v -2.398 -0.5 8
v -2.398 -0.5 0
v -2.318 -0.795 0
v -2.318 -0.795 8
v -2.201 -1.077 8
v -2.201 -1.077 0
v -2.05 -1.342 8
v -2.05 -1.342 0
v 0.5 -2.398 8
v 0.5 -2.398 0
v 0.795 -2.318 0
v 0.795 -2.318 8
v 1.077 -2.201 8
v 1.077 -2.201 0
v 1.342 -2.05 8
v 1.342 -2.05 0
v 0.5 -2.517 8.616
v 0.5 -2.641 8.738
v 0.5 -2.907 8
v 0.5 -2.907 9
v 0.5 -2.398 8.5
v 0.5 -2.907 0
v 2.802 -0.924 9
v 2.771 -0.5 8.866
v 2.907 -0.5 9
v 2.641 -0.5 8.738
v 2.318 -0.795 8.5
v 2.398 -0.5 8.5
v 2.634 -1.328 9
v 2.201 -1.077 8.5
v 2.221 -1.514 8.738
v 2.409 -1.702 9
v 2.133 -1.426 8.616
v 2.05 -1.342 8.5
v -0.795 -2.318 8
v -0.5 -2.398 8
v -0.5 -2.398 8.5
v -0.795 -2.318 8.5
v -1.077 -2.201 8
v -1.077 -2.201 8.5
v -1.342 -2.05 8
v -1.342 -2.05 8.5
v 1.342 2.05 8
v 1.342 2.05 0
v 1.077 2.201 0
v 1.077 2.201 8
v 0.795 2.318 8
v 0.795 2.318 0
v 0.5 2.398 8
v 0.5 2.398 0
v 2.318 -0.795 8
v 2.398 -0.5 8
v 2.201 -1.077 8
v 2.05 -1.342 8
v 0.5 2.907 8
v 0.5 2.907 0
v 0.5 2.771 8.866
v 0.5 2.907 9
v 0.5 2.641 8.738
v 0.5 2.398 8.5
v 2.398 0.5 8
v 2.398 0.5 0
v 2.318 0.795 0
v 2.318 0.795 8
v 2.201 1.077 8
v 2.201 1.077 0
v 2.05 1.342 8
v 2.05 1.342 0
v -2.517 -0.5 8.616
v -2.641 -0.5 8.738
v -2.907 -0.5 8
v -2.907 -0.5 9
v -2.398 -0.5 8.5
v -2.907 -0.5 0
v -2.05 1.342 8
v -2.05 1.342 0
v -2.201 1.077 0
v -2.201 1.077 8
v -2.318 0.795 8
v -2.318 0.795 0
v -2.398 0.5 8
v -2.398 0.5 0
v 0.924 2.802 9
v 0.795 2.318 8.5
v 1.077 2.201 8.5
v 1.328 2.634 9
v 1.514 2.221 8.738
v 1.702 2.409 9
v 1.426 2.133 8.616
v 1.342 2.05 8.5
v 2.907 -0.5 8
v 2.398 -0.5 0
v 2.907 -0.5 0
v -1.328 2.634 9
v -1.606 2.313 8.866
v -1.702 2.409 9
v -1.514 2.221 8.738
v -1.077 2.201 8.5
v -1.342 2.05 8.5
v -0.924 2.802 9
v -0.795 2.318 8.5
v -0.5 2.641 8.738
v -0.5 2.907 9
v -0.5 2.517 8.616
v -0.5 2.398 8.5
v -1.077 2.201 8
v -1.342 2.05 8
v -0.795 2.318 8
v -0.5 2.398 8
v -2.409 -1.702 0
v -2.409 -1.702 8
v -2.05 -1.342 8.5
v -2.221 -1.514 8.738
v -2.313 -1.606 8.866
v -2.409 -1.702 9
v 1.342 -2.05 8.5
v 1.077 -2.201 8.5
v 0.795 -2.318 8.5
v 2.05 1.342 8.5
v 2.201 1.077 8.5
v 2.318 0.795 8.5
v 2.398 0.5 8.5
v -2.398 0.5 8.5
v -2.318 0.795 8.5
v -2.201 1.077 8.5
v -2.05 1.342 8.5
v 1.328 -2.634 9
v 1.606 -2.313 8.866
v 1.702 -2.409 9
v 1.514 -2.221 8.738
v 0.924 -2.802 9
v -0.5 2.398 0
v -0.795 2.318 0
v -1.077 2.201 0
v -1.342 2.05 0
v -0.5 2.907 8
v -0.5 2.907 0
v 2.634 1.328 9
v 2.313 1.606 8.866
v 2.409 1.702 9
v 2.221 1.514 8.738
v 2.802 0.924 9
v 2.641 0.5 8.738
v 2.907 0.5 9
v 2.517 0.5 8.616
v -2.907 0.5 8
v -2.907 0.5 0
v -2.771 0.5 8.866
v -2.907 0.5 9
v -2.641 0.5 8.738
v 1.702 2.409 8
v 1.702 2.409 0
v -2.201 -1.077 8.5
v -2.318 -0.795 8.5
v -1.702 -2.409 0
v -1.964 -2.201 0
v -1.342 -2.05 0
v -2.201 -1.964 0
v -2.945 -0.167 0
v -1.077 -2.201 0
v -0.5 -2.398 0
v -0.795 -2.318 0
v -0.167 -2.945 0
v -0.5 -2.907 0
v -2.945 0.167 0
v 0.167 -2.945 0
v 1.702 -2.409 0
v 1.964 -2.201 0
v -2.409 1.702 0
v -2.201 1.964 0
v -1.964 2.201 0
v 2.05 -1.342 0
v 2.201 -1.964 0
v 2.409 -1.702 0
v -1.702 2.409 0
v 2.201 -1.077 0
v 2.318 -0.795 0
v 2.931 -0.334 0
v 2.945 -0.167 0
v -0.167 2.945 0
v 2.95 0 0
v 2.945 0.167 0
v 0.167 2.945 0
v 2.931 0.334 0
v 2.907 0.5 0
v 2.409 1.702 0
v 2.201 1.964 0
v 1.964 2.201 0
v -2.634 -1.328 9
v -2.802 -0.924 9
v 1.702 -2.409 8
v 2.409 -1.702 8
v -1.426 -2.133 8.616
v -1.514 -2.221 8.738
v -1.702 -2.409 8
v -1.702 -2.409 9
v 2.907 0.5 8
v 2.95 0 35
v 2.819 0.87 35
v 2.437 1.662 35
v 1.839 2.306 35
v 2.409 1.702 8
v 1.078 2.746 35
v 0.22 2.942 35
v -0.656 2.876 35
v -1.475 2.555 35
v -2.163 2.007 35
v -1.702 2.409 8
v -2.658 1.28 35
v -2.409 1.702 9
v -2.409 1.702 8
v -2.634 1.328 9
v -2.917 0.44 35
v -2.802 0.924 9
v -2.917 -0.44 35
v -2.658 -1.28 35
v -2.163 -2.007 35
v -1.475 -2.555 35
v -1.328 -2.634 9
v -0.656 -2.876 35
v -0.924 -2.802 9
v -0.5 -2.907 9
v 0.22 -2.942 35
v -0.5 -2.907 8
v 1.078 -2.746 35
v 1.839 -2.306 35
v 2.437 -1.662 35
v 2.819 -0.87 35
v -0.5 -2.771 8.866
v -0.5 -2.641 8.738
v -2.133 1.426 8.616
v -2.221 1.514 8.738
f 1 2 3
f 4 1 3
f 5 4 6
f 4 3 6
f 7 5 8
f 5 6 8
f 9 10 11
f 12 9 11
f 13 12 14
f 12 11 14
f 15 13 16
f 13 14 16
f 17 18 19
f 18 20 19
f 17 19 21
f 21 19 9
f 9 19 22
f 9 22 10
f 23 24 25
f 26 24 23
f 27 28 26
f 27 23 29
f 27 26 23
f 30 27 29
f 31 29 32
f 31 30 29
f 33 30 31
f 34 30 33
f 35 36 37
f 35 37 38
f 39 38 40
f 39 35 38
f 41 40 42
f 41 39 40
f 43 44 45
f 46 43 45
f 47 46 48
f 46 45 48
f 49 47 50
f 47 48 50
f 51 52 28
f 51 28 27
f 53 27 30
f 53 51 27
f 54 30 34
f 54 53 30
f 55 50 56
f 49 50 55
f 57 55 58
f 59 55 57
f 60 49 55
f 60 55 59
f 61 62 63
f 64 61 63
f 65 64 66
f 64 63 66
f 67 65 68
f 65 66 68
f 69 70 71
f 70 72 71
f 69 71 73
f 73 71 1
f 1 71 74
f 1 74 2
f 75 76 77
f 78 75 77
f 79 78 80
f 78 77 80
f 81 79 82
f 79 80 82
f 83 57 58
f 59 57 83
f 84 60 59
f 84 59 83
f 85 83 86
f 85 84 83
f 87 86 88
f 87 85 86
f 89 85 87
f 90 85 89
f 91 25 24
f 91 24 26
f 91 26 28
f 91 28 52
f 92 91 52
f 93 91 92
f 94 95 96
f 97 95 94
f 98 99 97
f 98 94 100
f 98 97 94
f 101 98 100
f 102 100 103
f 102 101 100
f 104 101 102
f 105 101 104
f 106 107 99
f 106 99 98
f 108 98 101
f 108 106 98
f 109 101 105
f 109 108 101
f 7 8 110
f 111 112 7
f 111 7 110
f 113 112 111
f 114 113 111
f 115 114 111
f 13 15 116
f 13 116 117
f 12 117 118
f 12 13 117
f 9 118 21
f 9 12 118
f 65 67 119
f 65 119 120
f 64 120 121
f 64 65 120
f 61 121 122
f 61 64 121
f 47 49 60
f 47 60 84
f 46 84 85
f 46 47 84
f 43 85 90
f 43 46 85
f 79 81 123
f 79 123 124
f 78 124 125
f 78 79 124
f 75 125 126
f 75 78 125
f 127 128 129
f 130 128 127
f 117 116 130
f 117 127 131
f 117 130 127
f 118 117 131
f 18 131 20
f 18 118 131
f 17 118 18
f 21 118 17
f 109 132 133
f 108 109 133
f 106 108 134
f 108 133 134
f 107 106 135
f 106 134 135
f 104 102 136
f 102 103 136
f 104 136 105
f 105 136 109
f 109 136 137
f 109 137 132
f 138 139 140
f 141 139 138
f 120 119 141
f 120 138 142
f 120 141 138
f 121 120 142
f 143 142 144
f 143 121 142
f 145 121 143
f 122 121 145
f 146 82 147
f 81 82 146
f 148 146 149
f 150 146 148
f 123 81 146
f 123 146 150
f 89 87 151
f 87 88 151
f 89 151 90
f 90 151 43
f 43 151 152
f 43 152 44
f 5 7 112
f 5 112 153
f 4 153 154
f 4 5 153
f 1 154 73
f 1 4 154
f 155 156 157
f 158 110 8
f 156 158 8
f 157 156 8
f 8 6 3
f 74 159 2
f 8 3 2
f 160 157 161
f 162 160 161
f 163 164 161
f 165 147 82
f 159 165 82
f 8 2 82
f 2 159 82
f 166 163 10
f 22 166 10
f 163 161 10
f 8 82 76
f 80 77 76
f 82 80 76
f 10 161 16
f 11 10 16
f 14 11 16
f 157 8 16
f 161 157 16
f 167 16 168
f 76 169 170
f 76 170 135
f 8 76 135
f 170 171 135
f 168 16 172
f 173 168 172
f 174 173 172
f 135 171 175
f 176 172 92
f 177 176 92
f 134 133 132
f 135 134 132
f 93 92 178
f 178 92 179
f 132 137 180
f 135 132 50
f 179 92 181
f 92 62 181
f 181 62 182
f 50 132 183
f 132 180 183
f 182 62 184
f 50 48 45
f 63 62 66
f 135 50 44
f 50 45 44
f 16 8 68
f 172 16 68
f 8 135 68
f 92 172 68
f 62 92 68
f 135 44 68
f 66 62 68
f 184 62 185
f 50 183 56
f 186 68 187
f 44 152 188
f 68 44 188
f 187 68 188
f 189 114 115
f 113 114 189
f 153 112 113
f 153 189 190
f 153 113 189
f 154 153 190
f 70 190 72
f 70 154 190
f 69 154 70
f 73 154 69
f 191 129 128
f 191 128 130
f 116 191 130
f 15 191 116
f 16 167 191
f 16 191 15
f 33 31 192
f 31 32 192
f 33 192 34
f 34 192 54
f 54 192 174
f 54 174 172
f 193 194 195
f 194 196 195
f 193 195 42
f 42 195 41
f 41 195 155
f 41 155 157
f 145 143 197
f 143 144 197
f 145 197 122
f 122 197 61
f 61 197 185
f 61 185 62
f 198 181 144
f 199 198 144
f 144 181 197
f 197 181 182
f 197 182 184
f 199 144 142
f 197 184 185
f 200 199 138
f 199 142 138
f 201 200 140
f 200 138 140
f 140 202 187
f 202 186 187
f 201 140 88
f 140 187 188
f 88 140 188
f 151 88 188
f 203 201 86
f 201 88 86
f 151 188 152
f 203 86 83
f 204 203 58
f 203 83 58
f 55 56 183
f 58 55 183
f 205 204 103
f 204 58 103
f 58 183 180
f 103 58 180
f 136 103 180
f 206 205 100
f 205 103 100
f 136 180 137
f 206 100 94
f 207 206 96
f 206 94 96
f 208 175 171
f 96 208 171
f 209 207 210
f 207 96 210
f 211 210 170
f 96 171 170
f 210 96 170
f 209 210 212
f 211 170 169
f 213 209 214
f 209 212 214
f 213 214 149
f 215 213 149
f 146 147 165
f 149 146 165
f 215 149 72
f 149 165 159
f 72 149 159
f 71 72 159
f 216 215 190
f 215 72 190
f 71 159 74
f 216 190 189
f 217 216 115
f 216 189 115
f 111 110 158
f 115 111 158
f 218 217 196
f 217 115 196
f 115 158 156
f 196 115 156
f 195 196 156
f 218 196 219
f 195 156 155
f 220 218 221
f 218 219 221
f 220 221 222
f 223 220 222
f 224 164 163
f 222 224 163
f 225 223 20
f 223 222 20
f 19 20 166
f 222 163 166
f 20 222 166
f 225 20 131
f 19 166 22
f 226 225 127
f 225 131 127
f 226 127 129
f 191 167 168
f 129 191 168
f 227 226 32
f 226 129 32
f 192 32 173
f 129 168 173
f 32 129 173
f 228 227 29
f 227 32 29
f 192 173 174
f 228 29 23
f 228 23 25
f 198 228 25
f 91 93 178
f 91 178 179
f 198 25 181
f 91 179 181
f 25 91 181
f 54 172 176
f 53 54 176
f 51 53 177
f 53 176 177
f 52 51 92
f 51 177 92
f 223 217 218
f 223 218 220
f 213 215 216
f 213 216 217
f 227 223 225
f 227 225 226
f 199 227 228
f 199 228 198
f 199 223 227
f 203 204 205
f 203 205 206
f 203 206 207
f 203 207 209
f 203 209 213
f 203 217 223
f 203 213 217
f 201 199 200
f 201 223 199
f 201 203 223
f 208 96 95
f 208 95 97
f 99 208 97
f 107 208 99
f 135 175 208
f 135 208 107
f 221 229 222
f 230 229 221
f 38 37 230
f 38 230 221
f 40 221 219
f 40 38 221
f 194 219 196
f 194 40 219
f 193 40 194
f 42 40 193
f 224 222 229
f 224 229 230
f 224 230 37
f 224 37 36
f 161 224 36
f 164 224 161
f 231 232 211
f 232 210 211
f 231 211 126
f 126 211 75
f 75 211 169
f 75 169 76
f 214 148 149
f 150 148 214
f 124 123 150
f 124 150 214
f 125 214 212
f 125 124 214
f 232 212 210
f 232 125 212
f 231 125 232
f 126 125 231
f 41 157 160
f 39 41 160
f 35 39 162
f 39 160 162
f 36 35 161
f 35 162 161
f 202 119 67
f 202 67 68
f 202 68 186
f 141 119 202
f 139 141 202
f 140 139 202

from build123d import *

# Parameters (mm, degrees)
SKETCH1_R           = 2.95
BOSS_EXTRUDE1_DEPTH = 35
CUT_EXTRUDE1_DEPTH  = 8
CHAMFER1_SIZE       = 1


with BuildPart() as part:
    # Sketch1 → Boss-Extrude1 (new body)
    with BuildSketch(Plane.XY):
        Circle(SKETCH1_R)
    extrude(amount=BOSS_EXTRUDE1_DEPTH)

    # Sketch2 → Cut-Extrude1 (cut)
    with BuildSketch(Plane(origin=(0, 0, 0), x_dir=(-1, 0, 0), z_dir=(0, 0, -1))):
        with BuildLine():
            ThreePointArc((-2.398436991, 0.5), (-2.263504855, 0.937574409), (-2.049504451, 1.34239767))
            Line((-2.049504451, 1.34239767), (-2.409337912, 1.702231131))
            ThreePointArc((-2.409337912, 1.702231131), (-2.725444621, 1.128916125), (-2.907318352, 0.5))
            Line((-2.907318352, 0.5), (-2.398436991, 0.5))
        make_face()
        with BuildLine():
            ThreePointArc((-1.34239767, 2.049504451), (-0.937574409, 2.263504855), (-0.5, 2.398436991))
            Line((-0.5, 2.398436991), (-0.5, 2.907318352))
            ThreePointArc((-0.5, 2.907318352), (-1.128916125, 2.725444621), (-1.702231131, 2.409337912))
            Line((-1.702231131, 2.409337912), (-1.34239767, 2.049504451))
        make_face()
        with BuildLine():
            Line((0.5, 2.907318352), (0.5, 2.398436991))
            ThreePointArc((0.5, 2.398436991), (0.937574409, 2.263504855), (1.34239767, 2.049504451))
            Line((1.34239767, 2.049504451), (1.702231131, 2.409337912))
            ThreePointArc((1.702231131, 2.409337912), (1.128916125, 2.725444621), (0.5, 2.907318352))
        make_face()
        with BuildLine():
            Line((2.409337912, 1.702231131), (2.049504451, 1.34239767))
            ThreePointArc((2.049504451, 1.34239767), (2.263504855, 0.937574409), (2.398436991, 0.5))
            Line((2.398436991, 0.5), (2.907318352, 0.5))
            ThreePointArc((2.907318352, 0.5), (2.725444621, 1.128916125), (2.409337912, 1.702231131))
        make_face()
        with BuildLine():
            Line((2.907318352, -0.5), (2.398436991, -0.5))
            ThreePointArc((2.398436991, -0.5), (2.263504855, -0.937574409), (2.049504451, -1.34239767))
            Line((2.049504451, -1.34239767), (2.409337912, -1.702231131))
            ThreePointArc((2.409337912, -1.702231131), (2.725444621, -1.128916125), (2.907318352, -0.5))
        make_face()
        with BuildLine():
            Line((1.702231131, -2.409337912), (1.34239767, -2.049504451))
            ThreePointArc((1.34239767, -2.049504451), (0.937574409, -2.263504855), (0.5, -2.398436991))
            Line((0.5, -2.398436991), (0.5, -2.907318352))
            ThreePointArc((0.5, -2.907318352), (1.128916125, -2.725444621), (1.702231131, -2.409337912))
        make_face()
        with BuildLine():
            ThreePointArc((-0.5, -2.398436991), (-0.937574409, -2.263504855), (-1.34239767, -2.049504451))
            Line((-1.34239767, -2.049504451), (-1.702231131, -2.409337912))
            ThreePointArc((-1.702231131, -2.409337912), (-1.128916125, -2.725444621), (-0.5, -2.907318352))
            Line((-0.5, -2.907318352), (-0.5, -2.398436991))
        make_face()
        with BuildLine():
            ThreePointArc((-2.049504451, -1.34239767), (-2.263504855, -0.937574409), (-2.398436991, -0.5))
            Line((-2.398436991, -0.5), (-2.907318352, -0.5))
            ThreePointArc((-2.907318352, -0.5), (-2.725444621, -1.128916125), (-2.409337912, -1.702231131))
            Line((-2.409337912, -1.702231131), (-2.049504451, -1.34239767))
        make_face()
    extrude(amount=-CUT_EXTRUDE1_DEPTH, mode=Mode.SUBTRACT)

    # Chamfer1
    # the kernel refuses this chamfer: 1 mm, written as the material it takes off along each edge
    with BuildSketch(Plane(origin=(0, 0, 8), x_dir=(0.6453423073627431, -0.7638935176631171, 0), z_dir=(0.7638935176631171, 0.6453423073627431, 0))) as chamfer1_piece_1_section:
        Polygon((2.95, -CHAMFER1_SIZE), (2.95 - CHAMFER1_SIZE, 0), (2.95, 0), align=None)
    chamfer1_piece_1 = revolve(axis=Axis((0, 0, 8), (0, 0, -1)), revolution_arc=125.382690704, mode=Mode.PRIVATE)
    chamfer1_piece_1 = split(chamfer1_piece_1, bisect_by=Plane(origin=(0.5, 0, 8), z_dir=(1, 0, 0)), keep=Keep.TOP, mode=Mode.PRIVATE)
    chamfer1_piece_1 = split(chamfer1_piece_1, bisect_by=Plane(origin=(-0.353553391, -0.353553391, 8), z_dir=(-0.7071067811865415, -0.7071067811865537, 0)), keep=Keep.TOP, mode=Mode.PRIVATE)
    chamfer1_piece_1 = chamfer1_piece_1 - Plane(origin=(0, 0, 8), x_dir=(0.20408163265306725, -0.9789538738948115, 0), z_dir=(0, 0, -1)) * Cylinder(2.45, 12, mode=Mode.PRIVATE)
    add(chamfer1_piece_1, mode=Mode.SUBTRACT)
    with BuildSketch(Plane(origin=(0, 0, 8), x_dir=(0.6453423073627431, -0.7638935176631171, 0), z_dir=(0.7638935176631171, 0.6453423073627431, 0))) as chamfer1_piece_2_section:
        Polygon((2.95, -CHAMFER1_SIZE), (2.95 - CHAMFER1_SIZE, 0), (2.95, 0), align=None)
    chamfer1_piece_2 = revolve(axis=Axis((0, 0, 8), (0, 0, -1)), revolution_arc=125.382690704, mode=Mode.PRIVATE)
    chamfer1_piece_2 = split(chamfer1_piece_2, bisect_by=Plane(origin=(0.353553391, -0.353553391, 8), z_dir=(0.7071067811865517, -0.7071067811865434, 0)), keep=Keep.TOP, mode=Mode.PRIVATE)
    chamfer1_piece_2 = split(chamfer1_piece_2, bisect_by=Plane(origin=(-0.5, 0, 8), z_dir=(-1, 0, 0)), keep=Keep.TOP, mode=Mode.PRIVATE)
    chamfer1_piece_2 = chamfer1_piece_2 - Plane(origin=(0, 0, 8), x_dir=(0.20408163265306725, -0.9789538738948115, 0), z_dir=(0, 0, -1)) * Cylinder(2.45, 12, mode=Mode.PRIVATE)
    add(chamfer1_piece_2, mode=Mode.SUBTRACT)
    with BuildSketch(Plane(origin=(0, 0, 8), x_dir=(0.6453423073627431, -0.7638935176631171, 0), z_dir=(0.7638935176631171, 0.6453423073627431, 0))) as chamfer1_piece_3_section:
        Polygon((2.95, -CHAMFER1_SIZE), (2.95 - CHAMFER1_SIZE, 0), (2.95, 0), align=None)
    chamfer1_piece_3 = revolve(axis=Axis((0, 0, 8), (0, 0, -1)), revolution_arc=125.382690704, mode=Mode.PRIVATE)
    chamfer1_piece_3 = split(chamfer1_piece_3, bisect_by=Plane(origin=(0, -0.5, 8), z_dir=(0, -1, 0)), keep=Keep.TOP, mode=Mode.PRIVATE)
    chamfer1_piece_3 = split(chamfer1_piece_3, bisect_by=Plane(origin=(-0.353553391, 0.353553391, 8), z_dir=(-0.7071067811865515, 0.7071067811865437, 0)), keep=Keep.TOP, mode=Mode.PRIVATE)
    chamfer1_piece_3 = chamfer1_piece_3 - Plane(origin=(0, 0, 8), x_dir=(0.20408163265306725, -0.9789538738948115, 0), z_dir=(0, 0, -1)) * Cylinder(2.45, 12, mode=Mode.PRIVATE)
    add(chamfer1_piece_3, mode=Mode.SUBTRACT)
    with BuildSketch(Plane(origin=(0, 0, 8), x_dir=(-0.083828364721268, -0.9964802081668046, 0), z_dir=(0.9964802081668046, -0.083828364721268, 0))) as chamfer1_piece_4_section:
        Polygon((2.95, -CHAMFER1_SIZE), (2.95 - CHAMFER1_SIZE, 0), (2.95, 0), align=None)
    chamfer1_piece_4 = revolve(axis=Axis((0, 0, 8), (0, 0, -1)), revolution_arc=125.382690704, mode=Mode.PRIVATE)
    chamfer1_piece_4 = split(chamfer1_piece_4, bisect_by=Plane(origin=(0.353553391, -0.353553391, 8), z_dir=(0.7071067811865517, -0.7071067811865434, 0)), keep=Keep.TOP, mode=Mode.PRIVATE)
    chamfer1_piece_4 = split(chamfer1_piece_4, bisect_by=Plane(origin=(-0.5, 0, 8), z_dir=(-1, 0, 0)), keep=Keep.TOP, mode=Mode.PRIVATE)
    chamfer1_piece_4 = chamfer1_piece_4 - Plane(origin=(0, 0, 8), x_dir=(-0.5479174163352548, -0.8365324290644679, 0), z_dir=(0, 0, -1)) * Cylinder(2.45, 12, mode=Mode.PRIVATE)
    add(chamfer1_piece_4, mode=Mode.SUBTRACT)
    with BuildSketch(Plane(origin=(0, 0, 8), x_dir=(-0.083828364721268, -0.9964802081668046, 0), z_dir=(0.9964802081668046, -0.083828364721268, 0))) as chamfer1_piece_5_section:
        Polygon((2.95, -CHAMFER1_SIZE), (2.95 - CHAMFER1_SIZE, 0), (2.95, 0), align=None)
    chamfer1_piece_5 = revolve(axis=Axis((0, 0, 8), (0, 0, -1)), revolution_arc=125.382690704, mode=Mode.PRIVATE)
    chamfer1_piece_5 = split(chamfer1_piece_5, bisect_by=Plane(origin=(0, -0.5, 8), z_dir=(0, -1, 0)), keep=Keep.TOP, mode=Mode.PRIVATE)
    chamfer1_piece_5 = split(chamfer1_piece_5, bisect_by=Plane(origin=(-0.353553391, 0.353553391, 8), z_dir=(-0.7071067811865515, 0.7071067811865437, 0)), keep=Keep.TOP, mode=Mode.PRIVATE)
    chamfer1_piece_5 = chamfer1_piece_5 - Plane(origin=(0, 0, 8), x_dir=(-0.5479174163352548, -0.8365324290644679, 0), z_dir=(0, 0, -1)) * Cylinder(2.45, 12, mode=Mode.PRIVATE)
    add(chamfer1_piece_5, mode=Mode.SUBTRACT)
    with BuildSketch(Plane(origin=(0, 0, 8), x_dir=(-0.083828364721268, -0.9964802081668046, 0), z_dir=(0.9964802081668046, -0.083828364721268, 0))) as chamfer1_piece_6_section:
        Polygon((2.95, -CHAMFER1_SIZE), (2.95 - CHAMFER1_SIZE, 0), (2.95, 0), align=None)
    chamfer1_piece_6 = revolve(axis=Axis((0, 0, 8), (0, 0, -1)), revolution_arc=125.382690704, mode=Mode.PRIVATE)
    chamfer1_piece_6 = split(chamfer1_piece_6, bisect_by=Plane(origin=(-0.353553391, -0.353553391, 8), z_dir=(-0.7071067811865454, -0.7071067811865497, 0)), keep=Keep.TOP, mode=Mode.PRIVATE)
    chamfer1_piece_6 = split(chamfer1_piece_6, bisect_by=Plane(origin=(0, 0.5, 8), z_dir=(0, 1, 0)), keep=Keep.TOP, mode=Mode.PRIVATE)
    chamfer1_piece_6 = chamfer1_piece_6 - Plane(origin=(0, 0, 8), x_dir=(-0.5479174163352548, -0.8365324290644679, 0), z_dir=(0, 0, -1)) * Cylinder(2.45, 12, mode=Mode.PRIVATE)
    add(chamfer1_piece_6, mode=Mode.SUBTRACT)
    with BuildSketch(Plane(origin=(0, 0, 8), x_dir=(-0.7638935176631205, -0.645342307362739, 0), z_dir=(0.645342307362739, -0.7638935176631205, 0))) as chamfer1_piece_7_section:
        Polygon((2.95, -CHAMFER1_SIZE), (2.95 - CHAMFER1_SIZE, 0), (2.95, 0), align=None)
    chamfer1_piece_7 = revolve(axis=Axis((0, 0, 8), (0, 0, -1)), revolution_arc=125.382690704, mode=Mode.PRIVATE)
    chamfer1_piece_7 = split(chamfer1_piece_7, bisect_by=Plane(origin=(0, -0.5, 8), z_dir=(0, -1, 0)), keep=Keep.TOP, mode=Mode.PRIVATE)
    chamfer1_piece_7 = split(chamfer1_piece_7, bisect_by=Plane(origin=(-0.353553391, 0.353553391, 8), z_dir=(-0.7071067811865515, 0.7071067811865437, 0)), keep=Keep.TOP, mode=Mode.PRIVATE)
    chamfer1_piece_7 = chamfer1_piece_7 - Plane(origin=(0, 0, 8), x_dir=(-0.9789538738948118, -0.20408163265306617, 0), z_dir=(0, 0, -1)) * Cylinder(2.45, 12, mode=Mode.PRIVATE)
    add(chamfer1_piece_7, mode=Mode.SUBTRACT)
    with BuildSketch(Plane(origin=(0, 0, 8), x_dir=(-0.7638935176631205, -0.645342307362739, 0), z_dir=(0.645342307362739, -0.7638935176631205, 0))) as chamfer1_piece_8_section:
        Polygon((2.95, -CHAMFER1_SIZE), (2.95 - CHAMFER1_SIZE, 0), (2.95, 0), align=None)
    chamfer1_piece_8 = revolve(axis=Axis((0, 0, 8), (0, 0, -1)), revolution_arc=125.382690704, mode=Mode.PRIVATE)
    chamfer1_piece_8 = split(chamfer1_piece_8, bisect_by=Plane(origin=(-0.353553391, -0.353553391, 8), z_dir=(-0.7071067811865454, -0.7071067811865497, 0)), keep=Keep.TOP, mode=Mode.PRIVATE)
    chamfer1_piece_8 = split(chamfer1_piece_8, bisect_by=Plane(origin=(0, 0.5, 8), z_dir=(0, 1, 0)), keep=Keep.TOP, mode=Mode.PRIVATE)
    chamfer1_piece_8 = chamfer1_piece_8 - Plane(origin=(0, 0, 8), x_dir=(-0.9789538738948118, -0.20408163265306617, 0), z_dir=(0, 0, -1)) * Cylinder(2.45, 12, mode=Mode.PRIVATE)
    add(chamfer1_piece_8, mode=Mode.SUBTRACT)
    with BuildSketch(Plane(origin=(0, 0, 8), x_dir=(-0.7638935176631205, -0.645342307362739, 0), z_dir=(0.645342307362739, -0.7638935176631205, 0))) as chamfer1_piece_9_section:
        Polygon((2.95, -CHAMFER1_SIZE), (2.95 - CHAMFER1_SIZE, 0), (2.95, 0), align=None)
    chamfer1_piece_9 = revolve(axis=Axis((0, 0, 8), (0, 0, -1)), revolution_arc=125.382690704, mode=Mode.PRIVATE)
    chamfer1_piece_9 = split(chamfer1_piece_9, bisect_by=Plane(origin=(-0.5, 0, 8), z_dir=(-1, 0, 0)), keep=Keep.TOP, mode=Mode.PRIVATE)
    chamfer1_piece_9 = split(chamfer1_piece_9, bisect_by=Plane(origin=(0.353553391, 0.353553391, 8), z_dir=(0.7071067811865474, 0.7071067811865477, 0)), keep=Keep.TOP, mode=Mode.PRIVATE)
    chamfer1_piece_9 = chamfer1_piece_9 - Plane(origin=(0, 0, 8), x_dir=(-0.9789538738948118, -0.20408163265306617, 0), z_dir=(0, 0, -1)) * Cylinder(2.45, 12, mode=Mode.PRIVATE)
    add(chamfer1_piece_9, mode=Mode.SUBTRACT)
    with BuildSketch(Plane(origin=(0, 0, 8), x_dir=(-0.9964802081668033, 0.08382836472128195, 0), z_dir=(-0.08382836472128195, -0.9964802081668033, 0))) as chamfer1_piece_10_section:
        Polygon((2.95, -CHAMFER1_SIZE), (2.95 - CHAMFER1_SIZE, 0), (2.95, 0), align=None)
    chamfer1_piece_10 = revolve(axis=Axis((0, 0, 8), (0, 0, -1)), revolution_arc=125.382690704, mode=Mode.PRIVATE)
    chamfer1_piece_10 = split(chamfer1_piece_10, bisect_by=Plane(origin=(-0.353553391, -0.353553391, 8), z_dir=(-0.7071067811865454, -0.7071067811865497, 0)), keep=Keep.TOP, mode=Mode.PRIVATE)
    chamfer1_piece_10 = split(chamfer1_piece_10, bisect_by=Plane(origin=(0, 0.5, 8), z_dir=(0, 1, 0)), keep=Keep.TOP, mode=Mode.PRIVATE)
    chamfer1_piece_10 = chamfer1_piece_10 - Plane(origin=(0, 0, 8), x_dir=(-0.836532429064466, 0.5479174163352577, 0), z_dir=(0, 0, -1)) * Cylinder(2.45, 12, mode=Mode.PRIVATE)
    add(chamfer1_piece_10, mode=Mode.SUBTRACT)
    with BuildSketch(Plane(origin=(0, 0, 8), x_dir=(-0.9964802081668033, 0.08382836472128195, 0), z_dir=(-0.08382836472128195, -0.9964802081668033, 0))) as chamfer1_piece_11_section:
        Polygon((2.95, -CHAMFER1_SIZE), (2.95 - CHAMFER1_SIZE, 0), (2.95, 0), align=None)
    chamfer1_piece_11 = revolve(axis=Axis((0, 0, 8), (0, 0, -1)), revolution_arc=125.382690704, mode=Mode.PRIVATE)
    chamfer1_piece_11 = split(chamfer1_piece_11, bisect_by=Plane(origin=(-0.5, 0, 8), z_dir=(-1, 0, 0)), keep=Keep.TOP, mode=Mode.PRIVATE)
    chamfer1_piece_11 = split(chamfer1_piece_11, bisect_by=Plane(origin=(0.353553391, 0.353553391, 8), z_dir=(0.7071067811865474, 0.7071067811865477, 0)), keep=Keep.TOP, mode=Mode.PRIVATE)
    chamfer1_piece_11 = chamfer1_piece_11 - Plane(origin=(0, 0, 8), x_dir=(-0.836532429064466, 0.5479174163352577, 0), z_dir=(0, 0, -1)) * Cylinder(2.45, 12, mode=Mode.PRIVATE)
    add(chamfer1_piece_11, mode=Mode.SUBTRACT)
    with BuildSketch(Plane(origin=(0, 0, 8), x_dir=(-0.9964802081668033, 0.08382836472128195, 0), z_dir=(-0.08382836472128195, -0.9964802081668033, 0))) as chamfer1_piece_12_section:
        Polygon((2.95, -CHAMFER1_SIZE), (2.95 - CHAMFER1_SIZE, 0), (2.95, 0), align=None)
    chamfer1_piece_12 = revolve(axis=Axis((0, 0, 8), (0, 0, -1)), revolution_arc=125.382690704, mode=Mode.PRIVATE)
    chamfer1_piece_12 = split(chamfer1_piece_12, bisect_by=Plane(origin=(-0.353553391, 0.353553391, 8), z_dir=(-0.7071067811865565, 0.7071067811865386, 0)), keep=Keep.TOP, mode=Mode.PRIVATE)
    chamfer1_piece_12 = split(chamfer1_piece_12, bisect_by=Plane(origin=(0.5, 0, 8), z_dir=(1, 0, 0)), keep=Keep.TOP, mode=Mode.PRIVATE)
    chamfer1_piece_12 = chamfer1_piece_12 - Plane(origin=(0, 0, 8), x_dir=(-0.836532429064466, 0.5479174163352577, 0), z_dir=(0, 0, -1)) * Cylinder(2.45, 12, mode=Mode.PRIVATE)
    add(chamfer1_piece_12, mode=Mode.SUBTRACT)
    with BuildSketch(Plane(origin=(0, 0, 8), x_dir=(0.9964802081668043, -0.08382836472127134, 0), z_dir=(0.08382836472127134, 0.9964802081668043, 0))) as chamfer1_piece_13_section:
        Polygon((2.95, -CHAMFER1_SIZE), (2.95 - CHAMFER1_SIZE, 0), (2.95, 0), align=None)
    chamfer1_piece_13 = revolve(axis=Axis((0, 0, 8), (0, 0, -1)), revolution_arc=125.382690704, mode=Mode.PRIVATE)
    chamfer1_piece_13 = split(chamfer1_piece_13, bisect_by=Plane(origin=(0.353553391, 0.353553391, 8), z_dir=(0.707106781186541, 0.7071067811865541, 0)), keep=Keep.TOP, mode=Mode.PRIVATE)
    chamfer1_piece_13 = split(chamfer1_piece_13, bisect_by=Plane(origin=(0, -0.5, 8), z_dir=(0, -1, 0)), keep=Keep.TOP, mode=Mode.PRIVATE)
    chamfer1_piece_13 = chamfer1_piece_13 - Plane(origin=(0, 0, 8), x_dir=(0.8365324290644678, -0.5479174163352549, 0), z_dir=(0, 0, -1)) * Cylinder(2.45, 12, mode=Mode.PRIVATE)
    add(chamfer1_piece_13, mode=Mode.SUBTRACT)
    with BuildSketch(Plane(origin=(0, 0, 8), x_dir=(0.9964802081668043, -0.08382836472127134, 0), z_dir=(0.08382836472127134, 0.9964802081668043, 0))) as chamfer1_piece_14_section:
        Polygon((2.95, -CHAMFER1_SIZE), (2.95 - CHAMFER1_SIZE, 0), (2.95, 0), align=None)
    chamfer1_piece_14 = revolve(axis=Axis((0, 0, 8), (0, 0, -1)), revolution_arc=125.382690704, mode=Mode.PRIVATE)
    chamfer1_piece_14 = split(chamfer1_piece_14, bisect_by=Plane(origin=(0.5, 0, 8), z_dir=(1, 0, 0)), keep=Keep.TOP, mode=Mode.PRIVATE)
    chamfer1_piece_14 = split(chamfer1_piece_14, bisect_by=Plane(origin=(-0.353553391, -0.353553391, 8), z_dir=(-0.7071067811865415, -0.7071067811865537, 0)), keep=Keep.TOP, mode=Mode.PRIVATE)
    chamfer1_piece_14 = chamfer1_piece_14 - Plane(origin=(0, 0, 8), x_dir=(0.8365324290644678, -0.5479174163352549, 0), z_dir=(0, 0, -1)) * Cylinder(2.45, 12, mode=Mode.PRIVATE)
    add(chamfer1_piece_14, mode=Mode.SUBTRACT)
    with BuildSketch(Plane(origin=(0, 0, 8), x_dir=(0.9964802081668043, -0.08382836472127134, 0), z_dir=(0.08382836472127134, 0.9964802081668043, 0))) as chamfer1_piece_15_section:
        Polygon((2.95, -CHAMFER1_SIZE), (2.95 - CHAMFER1_SIZE, 0), (2.95, 0), align=None)
    chamfer1_piece_15 = revolve(axis=Axis((0, 0, 8), (0, 0, -1)), revolution_arc=125.382690704, mode=Mode.PRIVATE)
    chamfer1_piece_15 = split(chamfer1_piece_15, bisect_by=Plane(origin=(0.353553391, -0.353553391, 8), z_dir=(0.7071067811865517, -0.7071067811865434, 0)), keep=Keep.TOP, mode=Mode.PRIVATE)
    chamfer1_piece_15 = split(chamfer1_piece_15, bisect_by=Plane(origin=(-0.5, 0, 8), z_dir=(-1, 0, 0)), keep=Keep.TOP, mode=Mode.PRIVATE)
    chamfer1_piece_15 = chamfer1_piece_15 - Plane(origin=(0, 0, 8), x_dir=(0.8365324290644678, -0.5479174163352549, 0), z_dir=(0, 0, -1)) * Cylinder(2.45, 12, mode=Mode.PRIVATE)
    add(chamfer1_piece_15, mode=Mode.SUBTRACT)
    with BuildSketch(Plane(origin=(0, 0, 8), x_dir=(0.7638935176631216, 0.6453423073627377, 0), z_dir=(-0.6453423073627377, 0.7638935176631216, 0))) as chamfer1_piece_16_section:
        Polygon((2.95, -CHAMFER1_SIZE), (2.95 - CHAMFER1_SIZE, 0), (2.95, 0), align=None)
    chamfer1_piece_16 = revolve(axis=Axis((0, 0, 8), (0, 0, -1)), revolution_arc=125.382690704, mode=Mode.PRIVATE)
    chamfer1_piece_16 = split(chamfer1_piece_16, bisect_by=Plane(origin=(0, 0.5, 8), z_dir=(0, 1, 0)), keep=Keep.TOP, mode=Mode.PRIVATE)
    chamfer1_piece_16 = split(chamfer1_piece_16, bisect_by=Plane(origin=(0.353553391, -0.353553391, 8), z_dir=(0.707106781186556, -0.707106781186539, 0)), keep=Keep.TOP, mode=Mode.PRIVATE)
    chamfer1_piece_16 = chamfer1_piece_16 - Plane(origin=(0, 0, 8), x_dir=(0.8365324290644678, -0.5479174163352549, 0), z_dir=(0, 0, -1)) * Cylinder(2.45, 12, mode=Mode.PRIVATE)
    add(chamfer1_piece_16, mode=Mode.SUBTRACT)
    with BuildSketch(Plane(origin=(0, 0, 8), x_dir=(0.7638935176631216, 0.6453423073627377, 0), z_dir=(-0.6453423073627377, 0.7638935176631216, 0))) as chamfer1_piece_17_section:
        Polygon((2.95, -CHAMFER1_SIZE), (2.95 - CHAMFER1_SIZE, 0), (2.95, 0), align=None)
    chamfer1_piece_17 = revolve(axis=Axis((0, 0, 8), (0, 0, -1)), revolution_arc=125.382690704, mode=Mode.PRIVATE)
    chamfer1_piece_17 = split(chamfer1_piece_17, bisect_by=Plane(origin=(0.353553391, 0.353553391, 8), z_dir=(0.707106781186541, 0.7071067811865541, 0)), keep=Keep.TOP, mode=Mode.PRIVATE)
    chamfer1_piece_17 = split(chamfer1_piece_17, bisect_by=Plane(origin=(0, -0.5, 8), z_dir=(0, -1, 0)), keep=Keep.TOP, mode=Mode.PRIVATE)
    chamfer1_piece_17 = chamfer1_piece_17 - Plane(origin=(0, 0, 8), x_dir=(0.8365324290644678, -0.5479174163352549, 0), z_dir=(0, 0, -1)) * Cylinder(2.45, 12, mode=Mode.PRIVATE)
    add(chamfer1_piece_17, mode=Mode.SUBTRACT)
    with BuildSketch(Plane(origin=(0, 0, 8), x_dir=(0.7638935176631216, 0.6453423073627377, 0), z_dir=(-0.6453423073627377, 0.7638935176631216, 0))) as chamfer1_piece_18_section:
        Polygon((2.95, -CHAMFER1_SIZE), (2.95 - CHAMFER1_SIZE, 0), (2.95, 0), align=None)
    chamfer1_piece_18 = revolve(axis=Axis((0, 0, 8), (0, 0, -1)), revolution_arc=125.382690704, mode=Mode.PRIVATE)
    chamfer1_piece_18 = split(chamfer1_piece_18, bisect_by=Plane(origin=(0.5, 0, 8), z_dir=(1, 0, 0)), keep=Keep.TOP, mode=Mode.PRIVATE)
    chamfer1_piece_18 = split(chamfer1_piece_18, bisect_by=Plane(origin=(-0.353553391, -0.353553391, 8), z_dir=(-0.7071067811865415, -0.7071067811865537, 0)), keep=Keep.TOP, mode=Mode.PRIVATE)
    chamfer1_piece_18 = chamfer1_piece_18 - Plane(origin=(0, 0, 8), x_dir=(0.8365324290644678, -0.5479174163352549, 0), z_dir=(0, 0, -1)) * Cylinder(2.45, 12, mode=Mode.PRIVATE)
    add(chamfer1_piece_18, mode=Mode.SUBTRACT)
    with BuildSketch(Plane(origin=(0, 0, 8), x_dir=(0.08382836472126272, 0.996480208166805, 0), z_dir=(-0.996480208166805, 0.08382836472126272, 0))) as chamfer1_piece_19_section:
        Polygon((2.95, -CHAMFER1_SIZE), (2.95 - CHAMFER1_SIZE, 0), (2.95, 0), align=None)
    chamfer1_piece_19 = revolve(axis=Axis((0, 0, 8), (0, 0, -1)), revolution_arc=125.382690704, mode=Mode.PRIVATE)
    chamfer1_piece_19 = split(chamfer1_piece_19, bisect_by=Plane(origin=(-0.353553391, 0.353553391, 8), z_dir=(-0.7071067811865565, 0.7071067811865386, 0)), keep=Keep.TOP, mode=Mode.PRIVATE)
    chamfer1_piece_19 = split(chamfer1_piece_19, bisect_by=Plane(origin=(0.5, 0, 8), z_dir=(1, 0, 0)), keep=Keep.TOP, mode=Mode.PRIVATE)
    chamfer1_piece_19 = chamfer1_piece_19 - Plane(origin=(0, 0, 8), x_dir=(0.8365324290644678, -0.5479174163352549, 0), z_dir=(0, 0, -1)) * Cylinder(2.45, 12, mode=Mode.PRIVATE)
    add(chamfer1_piece_19, mode=Mode.SUBTRACT)
    with BuildSketch(Plane(origin=(0, 0, 8), x_dir=(0.08382836472126272, 0.996480208166805, 0), z_dir=(-0.996480208166805, 0.08382836472126272, 0))) as chamfer1_piece_20_section:
        Polygon((2.95, -CHAMFER1_SIZE), (2.95 - CHAMFER1_SIZE, 0), (2.95, 0), align=None)
    chamfer1_piece_20 = revolve(axis=Axis((0, 0, 8), (0, 0, -1)), revolution_arc=125.382690704, mode=Mode.PRIVATE)
    chamfer1_piece_20 = split(chamfer1_piece_20, bisect_by=Plane(origin=(0, 0.5, 8), z_dir=(0, 1, 0)), keep=Keep.TOP, mode=Mode.PRIVATE)
    chamfer1_piece_20 = split(chamfer1_piece_20, bisect_by=Plane(origin=(0.353553391, -0.353553391, 8), z_dir=(0.707106781186556, -0.707106781186539, 0)), keep=Keep.TOP, mode=Mode.PRIVATE)
    chamfer1_piece_20 = chamfer1_piece_20 - Plane(origin=(0, 0, 8), x_dir=(0.8365324290644678, -0.5479174163352549, 0), z_dir=(0, 0, -1)) * Cylinder(2.45, 12, mode=Mode.PRIVATE)
    add(chamfer1_piece_20, mode=Mode.SUBTRACT)
    with BuildSketch(Plane(origin=(0, 0, 8), x_dir=(0.08382836472126272, 0.996480208166805, 0), z_dir=(-0.996480208166805, 0.08382836472126272, 0))) as chamfer1_piece_21_section:
        Polygon((2.95, -CHAMFER1_SIZE), (2.95 - CHAMFER1_SIZE, 0), (2.95, 0), align=None)
    chamfer1_piece_21 = revolve(axis=Axis((0, 0, 8), (0, 0, -1)), revolution_arc=125.382690704, mode=Mode.PRIVATE)
    chamfer1_piece_21 = split(chamfer1_piece_21, bisect_by=Plane(origin=(0.353553391, 0.353553391, 8), z_dir=(0.707106781186541, 0.7071067811865541, 0)), keep=Keep.TOP, mode=Mode.PRIVATE)
    chamfer1_piece_21 = split(chamfer1_piece_21, bisect_by=Plane(origin=(0, -0.5, 8), z_dir=(0, -1, 0)), keep=Keep.TOP, mode=Mode.PRIVATE)
    chamfer1_piece_21 = chamfer1_piece_21 - Plane(origin=(0, 0, 8), x_dir=(0.8365324290644678, -0.5479174163352549, 0), z_dir=(0, 0, -1)) * Cylinder(2.45, 12, mode=Mode.PRIVATE)
    add(chamfer1_piece_21, mode=Mode.SUBTRACT)
    with BuildSketch(Plane(origin=(0, 0, 8), x_dir=(-0.6453423073627307, 0.7638935176631274, 0), z_dir=(-0.7638935176631274, -0.6453423073627307, 0))) as chamfer1_piece_22_section:
        Polygon((2.95, -CHAMFER1_SIZE), (2.95 - CHAMFER1_SIZE, 0), (2.95, 0), align=None)
    chamfer1_piece_22 = revolve(axis=Axis((0, 0, 8), (0, 0, -1)), revolution_arc=125.382690704, mode=Mode.PRIVATE)
    chamfer1_piece_22 = split(chamfer1_piece_22, bisect_by=Plane(origin=(-0.5, 0, 8), z_dir=(-1, 0, 0)), keep=Keep.TOP, mode=Mode.PRIVATE)
    chamfer1_piece_22 = split(chamfer1_piece_22, bisect_by=Plane(origin=(0.353553391, 0.353553391, 8), z_dir=(0.7071067811865474, 0.7071067811865477, 0)), keep=Keep.TOP, mode=Mode.PRIVATE)
    chamfer1_piece_22 = chamfer1_piece_22 - Plane(origin=(0, 0, 8), x_dir=(-0.2040816326530623, 0.9789538738948126, 0), z_dir=(0, 0, -1)) * Cylinder(2.45, 12, mode=Mode.PRIVATE)
    add(chamfer1_piece_22, mode=Mode.SUBTRACT)
    with BuildSketch(Plane(origin=(0, 0, 8), x_dir=(-0.6453423073627307, 0.7638935176631274, 0), z_dir=(-0.7638935176631274, -0.6453423073627307, 0))) as chamfer1_piece_23_section:
        Polygon((2.95, -CHAMFER1_SIZE), (2.95 - CHAMFER1_SIZE, 0), (2.95, 0), align=None)
    chamfer1_piece_23 = revolve(axis=Axis((0, 0, 8), (0, 0, -1)), revolution_arc=125.382690704, mode=Mode.PRIVATE)
    chamfer1_piece_23 = split(chamfer1_piece_23, bisect_by=Plane(origin=(-0.353553391, 0.353553391, 8), z_dir=(-0.7071067811865565, 0.7071067811865386, 0)), keep=Keep.TOP, mode=Mode.PRIVATE)
    chamfer1_piece_23 = split(chamfer1_piece_23, bisect_by=Plane(origin=(0.5, 0, 8), z_dir=(1, 0, 0)), keep=Keep.TOP, mode=Mode.PRIVATE)
    chamfer1_piece_23 = chamfer1_piece_23 - Plane(origin=(0, 0, 8), x_dir=(-0.2040816326530623, 0.9789538738948126, 0), z_dir=(0, 0, -1)) * Cylinder(2.45, 12, mode=Mode.PRIVATE)
    add(chamfer1_piece_23, mode=Mode.SUBTRACT)
    with BuildSketch(Plane(origin=(0, 0, 8), x_dir=(-0.6453423073627307, 0.7638935176631274, 0), z_dir=(-0.7638935176631274, -0.6453423073627307, 0))) as chamfer1_piece_24_section:
        Polygon((2.95, -CHAMFER1_SIZE), (2.95 - CHAMFER1_SIZE, 0), (2.95, 0), align=None)
    chamfer1_piece_24 = revolve(axis=Axis((0, 0, 8), (0, 0, -1)), revolution_arc=125.382690704, mode=Mode.PRIVATE)
    chamfer1_piece_24 = split(chamfer1_piece_24, bisect_by=Plane(origin=(0, 0.5, 8), z_dir=(0, 1, 0)), keep=Keep.TOP, mode=Mode.PRIVATE)
    chamfer1_piece_24 = split(chamfer1_piece_24, bisect_by=Plane(origin=(0.353553391, -0.353553391, 8), z_dir=(0.707106781186556, -0.707106781186539, 0)), keep=Keep.TOP, mode=Mode.PRIVATE)
    chamfer1_piece_24 = chamfer1_piece_24 - Plane(origin=(0, 0, 8), x_dir=(-0.2040816326530623, 0.9789538738948126, 0), z_dir=(0, 0, -1)) * Cylinder(2.45, 12, mode=Mode.PRIVATE)
    add(chamfer1_piece_24, mode=Mode.SUBTRACT)


solid = part.part
